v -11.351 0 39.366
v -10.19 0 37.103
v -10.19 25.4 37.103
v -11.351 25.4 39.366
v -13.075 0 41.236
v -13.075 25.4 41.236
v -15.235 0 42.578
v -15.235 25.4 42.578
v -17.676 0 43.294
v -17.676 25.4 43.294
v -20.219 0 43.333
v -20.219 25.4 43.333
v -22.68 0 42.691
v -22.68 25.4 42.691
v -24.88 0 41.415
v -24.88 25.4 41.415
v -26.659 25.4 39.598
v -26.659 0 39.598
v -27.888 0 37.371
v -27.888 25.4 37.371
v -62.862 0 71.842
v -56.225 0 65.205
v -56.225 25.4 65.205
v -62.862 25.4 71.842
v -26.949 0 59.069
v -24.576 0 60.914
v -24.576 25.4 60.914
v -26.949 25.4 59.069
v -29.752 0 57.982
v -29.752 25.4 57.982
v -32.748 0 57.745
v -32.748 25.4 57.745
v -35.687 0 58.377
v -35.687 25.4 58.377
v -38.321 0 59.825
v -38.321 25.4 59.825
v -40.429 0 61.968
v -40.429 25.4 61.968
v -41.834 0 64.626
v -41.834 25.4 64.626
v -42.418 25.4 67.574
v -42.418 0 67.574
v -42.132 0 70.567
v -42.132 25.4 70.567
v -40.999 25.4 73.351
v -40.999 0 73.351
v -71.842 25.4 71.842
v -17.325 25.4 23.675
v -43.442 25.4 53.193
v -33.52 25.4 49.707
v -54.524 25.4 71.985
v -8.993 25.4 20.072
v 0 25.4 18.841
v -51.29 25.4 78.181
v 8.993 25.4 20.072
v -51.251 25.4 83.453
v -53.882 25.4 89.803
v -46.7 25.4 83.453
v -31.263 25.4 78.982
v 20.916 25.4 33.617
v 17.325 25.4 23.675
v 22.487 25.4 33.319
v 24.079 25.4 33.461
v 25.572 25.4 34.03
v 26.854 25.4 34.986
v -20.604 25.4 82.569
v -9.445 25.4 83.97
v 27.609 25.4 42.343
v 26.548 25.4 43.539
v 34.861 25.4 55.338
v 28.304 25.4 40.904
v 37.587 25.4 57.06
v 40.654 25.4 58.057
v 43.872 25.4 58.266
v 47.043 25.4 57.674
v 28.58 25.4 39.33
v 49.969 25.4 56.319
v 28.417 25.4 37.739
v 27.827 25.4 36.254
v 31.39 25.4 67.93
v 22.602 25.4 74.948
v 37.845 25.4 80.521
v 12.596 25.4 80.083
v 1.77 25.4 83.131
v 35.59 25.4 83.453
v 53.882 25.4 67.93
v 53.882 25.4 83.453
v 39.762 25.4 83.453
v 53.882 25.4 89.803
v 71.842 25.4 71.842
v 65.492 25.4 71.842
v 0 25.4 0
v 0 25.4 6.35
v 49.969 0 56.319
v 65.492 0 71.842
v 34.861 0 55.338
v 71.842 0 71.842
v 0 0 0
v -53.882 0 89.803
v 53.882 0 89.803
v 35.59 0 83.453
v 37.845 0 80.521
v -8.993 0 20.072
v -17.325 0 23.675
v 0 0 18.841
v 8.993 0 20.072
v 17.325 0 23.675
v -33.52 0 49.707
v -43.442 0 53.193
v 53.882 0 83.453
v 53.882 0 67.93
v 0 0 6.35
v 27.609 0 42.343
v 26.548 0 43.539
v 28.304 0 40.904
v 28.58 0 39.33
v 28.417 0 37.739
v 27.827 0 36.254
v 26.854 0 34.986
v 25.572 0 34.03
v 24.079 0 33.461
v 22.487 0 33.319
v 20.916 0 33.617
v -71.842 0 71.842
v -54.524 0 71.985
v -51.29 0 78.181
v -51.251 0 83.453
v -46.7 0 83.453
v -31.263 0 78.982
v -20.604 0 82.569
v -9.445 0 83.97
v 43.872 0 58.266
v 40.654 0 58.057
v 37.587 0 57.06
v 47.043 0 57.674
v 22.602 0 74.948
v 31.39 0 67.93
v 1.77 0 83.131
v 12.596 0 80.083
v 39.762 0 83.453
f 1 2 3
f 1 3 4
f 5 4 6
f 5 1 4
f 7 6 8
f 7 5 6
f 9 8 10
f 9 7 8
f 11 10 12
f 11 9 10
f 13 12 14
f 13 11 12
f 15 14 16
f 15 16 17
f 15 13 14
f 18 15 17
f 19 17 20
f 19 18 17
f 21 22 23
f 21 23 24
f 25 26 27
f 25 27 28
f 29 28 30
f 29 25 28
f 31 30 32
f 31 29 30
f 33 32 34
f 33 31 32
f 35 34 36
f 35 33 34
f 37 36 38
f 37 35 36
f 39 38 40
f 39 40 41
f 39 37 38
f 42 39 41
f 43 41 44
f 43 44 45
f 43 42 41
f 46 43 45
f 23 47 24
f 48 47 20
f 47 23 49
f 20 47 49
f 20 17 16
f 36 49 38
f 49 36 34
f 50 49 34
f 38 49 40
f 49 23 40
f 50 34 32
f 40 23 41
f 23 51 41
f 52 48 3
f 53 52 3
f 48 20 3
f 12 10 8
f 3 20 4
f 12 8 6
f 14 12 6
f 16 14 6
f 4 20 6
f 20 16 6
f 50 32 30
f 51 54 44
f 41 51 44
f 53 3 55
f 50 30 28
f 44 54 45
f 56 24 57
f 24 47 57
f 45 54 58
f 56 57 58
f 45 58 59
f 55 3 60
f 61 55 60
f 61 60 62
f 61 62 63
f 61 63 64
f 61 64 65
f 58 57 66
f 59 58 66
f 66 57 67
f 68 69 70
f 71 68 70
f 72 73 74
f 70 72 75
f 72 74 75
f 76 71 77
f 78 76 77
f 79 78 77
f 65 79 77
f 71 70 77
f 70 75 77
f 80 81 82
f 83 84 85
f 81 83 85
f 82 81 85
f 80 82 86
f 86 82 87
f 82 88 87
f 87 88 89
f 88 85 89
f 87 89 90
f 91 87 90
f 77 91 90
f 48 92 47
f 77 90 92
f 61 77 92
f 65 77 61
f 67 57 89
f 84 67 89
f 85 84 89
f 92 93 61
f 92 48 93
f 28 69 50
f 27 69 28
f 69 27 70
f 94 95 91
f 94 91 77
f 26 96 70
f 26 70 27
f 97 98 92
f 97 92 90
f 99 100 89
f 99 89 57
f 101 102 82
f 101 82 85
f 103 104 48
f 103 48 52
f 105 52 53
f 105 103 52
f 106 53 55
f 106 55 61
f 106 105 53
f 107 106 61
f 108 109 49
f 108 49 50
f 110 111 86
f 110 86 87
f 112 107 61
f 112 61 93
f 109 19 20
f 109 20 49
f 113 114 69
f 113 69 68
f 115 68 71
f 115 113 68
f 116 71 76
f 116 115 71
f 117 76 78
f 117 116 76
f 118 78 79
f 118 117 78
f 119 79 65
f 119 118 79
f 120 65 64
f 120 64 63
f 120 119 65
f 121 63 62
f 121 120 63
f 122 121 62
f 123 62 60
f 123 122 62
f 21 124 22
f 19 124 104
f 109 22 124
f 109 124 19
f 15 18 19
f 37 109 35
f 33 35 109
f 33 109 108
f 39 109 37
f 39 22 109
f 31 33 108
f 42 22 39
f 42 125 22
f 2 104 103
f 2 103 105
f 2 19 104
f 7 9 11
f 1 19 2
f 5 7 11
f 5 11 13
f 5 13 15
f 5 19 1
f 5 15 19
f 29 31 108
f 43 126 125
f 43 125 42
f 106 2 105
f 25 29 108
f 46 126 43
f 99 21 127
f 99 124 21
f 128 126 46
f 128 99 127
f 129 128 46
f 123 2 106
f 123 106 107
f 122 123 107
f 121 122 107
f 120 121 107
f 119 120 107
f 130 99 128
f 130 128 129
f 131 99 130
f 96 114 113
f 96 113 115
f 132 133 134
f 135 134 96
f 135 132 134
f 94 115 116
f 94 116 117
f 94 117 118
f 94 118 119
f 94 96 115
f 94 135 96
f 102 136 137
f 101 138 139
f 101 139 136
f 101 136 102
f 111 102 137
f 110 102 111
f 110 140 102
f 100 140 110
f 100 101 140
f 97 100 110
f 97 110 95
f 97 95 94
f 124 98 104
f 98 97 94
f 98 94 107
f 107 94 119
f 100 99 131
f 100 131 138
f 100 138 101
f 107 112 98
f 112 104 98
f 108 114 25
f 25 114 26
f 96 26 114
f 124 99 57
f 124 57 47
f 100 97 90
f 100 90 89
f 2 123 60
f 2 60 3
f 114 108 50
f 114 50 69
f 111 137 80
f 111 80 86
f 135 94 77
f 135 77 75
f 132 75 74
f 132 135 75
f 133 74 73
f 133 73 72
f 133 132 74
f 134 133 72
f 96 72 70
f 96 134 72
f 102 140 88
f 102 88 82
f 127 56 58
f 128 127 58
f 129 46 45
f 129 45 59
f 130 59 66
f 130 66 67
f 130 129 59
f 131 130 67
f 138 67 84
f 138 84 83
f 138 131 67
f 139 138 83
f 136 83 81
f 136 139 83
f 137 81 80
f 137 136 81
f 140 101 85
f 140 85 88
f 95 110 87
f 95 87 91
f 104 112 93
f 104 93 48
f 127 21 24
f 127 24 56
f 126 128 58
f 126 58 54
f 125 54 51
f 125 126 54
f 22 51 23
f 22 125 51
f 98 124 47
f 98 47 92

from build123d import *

# Parameters (mm, degrees)
F1_DEPTH = 25.4


with BuildPart() as f1:
    # F0 (on Front) → F1 (new body)
    with BuildSketch(Plane.XZ):
        Polygon((-71.842049, 71.842049), (0, 0), (71.842049, 71.842049), (53.881537, 89.802561), (-53.881537, 89.802561), align=None)
        with BuildLine():
            Line((17.325188, 23.675188), (0, 6.35))
            Line((0, 6.35), (-17.325188, 23.675188))
            ThreePointArc((-17.325188, 23.675188), (0, 18.840947), (17.325188, 23.675188))
        make_face(mode=Mode.SUBTRACT)
        with BuildLine():
            Line((-27.88843, 37.371293), (-43.441594, 53.192612))
            Line((-43.441594, 53.192612), (-33.519749, 49.70656))
            Line((-33.519749, 49.70656), (26.547641, 43.538928))
            ThreePointArc((26.547641, 43.538928), (27.826581, 36.254042), (20.916322, 33.617079))
            Line((20.916322, 33.617079), (-10.190004, 37.103135))
            ThreePointArc((-10.190004, 37.103135), (-18.94585, 43.399421), (-27.88843, 37.371293))
        make_face(mode=Mode.SUBTRACT)
        with BuildLine():
            ThreePointArc((-46.700488, 83.452561), (-53.089277, 75.177991), (-56.225224, 65.20548))
            Line((-56.225224, 65.20548), (-62.861793, 71.842049))
            Line((-62.861793, 71.842049), (-51.251281, 83.452561))
            Line((-51.251281, 83.452561), (-46.700488, 83.452561))
        make_face(mode=Mode.SUBTRACT)
        with BuildLine():
            Line((53.881537, 67.93008), (53.881537, 83.452561))
            Line((53.881537, 83.452561), (65.492049, 71.842049))
            Line((65.492049, 71.842049), (49.96895, 56.31895))
            ThreePointArc((49.96895, 56.31895), (42.256735, 58.261775), (34.860542, 55.33788))
            Line((34.860542, 55.33788), (-24.575694, 60.914379))
            ThreePointArc((-24.575694, 60.914379), (-38.321211, 59.825174), (-40.998805, 73.351301))
            ThreePointArc((-40.998805, 73.351301), (-3.816385, 83.83065), (31.390447, 67.93008))
            Line((31.390447, 67.93008), (53.881537, 67.93008))
        make_face(mode=Mode.SUBTRACT)
        Polygon((37.845217, 80.521145), (35.590284, 83.452561), (39.761905, 83.452561), align=None, mode=Mode.SUBTRACT)
    extrude(amount=-F1_DEPTH)


solid = f1.part
